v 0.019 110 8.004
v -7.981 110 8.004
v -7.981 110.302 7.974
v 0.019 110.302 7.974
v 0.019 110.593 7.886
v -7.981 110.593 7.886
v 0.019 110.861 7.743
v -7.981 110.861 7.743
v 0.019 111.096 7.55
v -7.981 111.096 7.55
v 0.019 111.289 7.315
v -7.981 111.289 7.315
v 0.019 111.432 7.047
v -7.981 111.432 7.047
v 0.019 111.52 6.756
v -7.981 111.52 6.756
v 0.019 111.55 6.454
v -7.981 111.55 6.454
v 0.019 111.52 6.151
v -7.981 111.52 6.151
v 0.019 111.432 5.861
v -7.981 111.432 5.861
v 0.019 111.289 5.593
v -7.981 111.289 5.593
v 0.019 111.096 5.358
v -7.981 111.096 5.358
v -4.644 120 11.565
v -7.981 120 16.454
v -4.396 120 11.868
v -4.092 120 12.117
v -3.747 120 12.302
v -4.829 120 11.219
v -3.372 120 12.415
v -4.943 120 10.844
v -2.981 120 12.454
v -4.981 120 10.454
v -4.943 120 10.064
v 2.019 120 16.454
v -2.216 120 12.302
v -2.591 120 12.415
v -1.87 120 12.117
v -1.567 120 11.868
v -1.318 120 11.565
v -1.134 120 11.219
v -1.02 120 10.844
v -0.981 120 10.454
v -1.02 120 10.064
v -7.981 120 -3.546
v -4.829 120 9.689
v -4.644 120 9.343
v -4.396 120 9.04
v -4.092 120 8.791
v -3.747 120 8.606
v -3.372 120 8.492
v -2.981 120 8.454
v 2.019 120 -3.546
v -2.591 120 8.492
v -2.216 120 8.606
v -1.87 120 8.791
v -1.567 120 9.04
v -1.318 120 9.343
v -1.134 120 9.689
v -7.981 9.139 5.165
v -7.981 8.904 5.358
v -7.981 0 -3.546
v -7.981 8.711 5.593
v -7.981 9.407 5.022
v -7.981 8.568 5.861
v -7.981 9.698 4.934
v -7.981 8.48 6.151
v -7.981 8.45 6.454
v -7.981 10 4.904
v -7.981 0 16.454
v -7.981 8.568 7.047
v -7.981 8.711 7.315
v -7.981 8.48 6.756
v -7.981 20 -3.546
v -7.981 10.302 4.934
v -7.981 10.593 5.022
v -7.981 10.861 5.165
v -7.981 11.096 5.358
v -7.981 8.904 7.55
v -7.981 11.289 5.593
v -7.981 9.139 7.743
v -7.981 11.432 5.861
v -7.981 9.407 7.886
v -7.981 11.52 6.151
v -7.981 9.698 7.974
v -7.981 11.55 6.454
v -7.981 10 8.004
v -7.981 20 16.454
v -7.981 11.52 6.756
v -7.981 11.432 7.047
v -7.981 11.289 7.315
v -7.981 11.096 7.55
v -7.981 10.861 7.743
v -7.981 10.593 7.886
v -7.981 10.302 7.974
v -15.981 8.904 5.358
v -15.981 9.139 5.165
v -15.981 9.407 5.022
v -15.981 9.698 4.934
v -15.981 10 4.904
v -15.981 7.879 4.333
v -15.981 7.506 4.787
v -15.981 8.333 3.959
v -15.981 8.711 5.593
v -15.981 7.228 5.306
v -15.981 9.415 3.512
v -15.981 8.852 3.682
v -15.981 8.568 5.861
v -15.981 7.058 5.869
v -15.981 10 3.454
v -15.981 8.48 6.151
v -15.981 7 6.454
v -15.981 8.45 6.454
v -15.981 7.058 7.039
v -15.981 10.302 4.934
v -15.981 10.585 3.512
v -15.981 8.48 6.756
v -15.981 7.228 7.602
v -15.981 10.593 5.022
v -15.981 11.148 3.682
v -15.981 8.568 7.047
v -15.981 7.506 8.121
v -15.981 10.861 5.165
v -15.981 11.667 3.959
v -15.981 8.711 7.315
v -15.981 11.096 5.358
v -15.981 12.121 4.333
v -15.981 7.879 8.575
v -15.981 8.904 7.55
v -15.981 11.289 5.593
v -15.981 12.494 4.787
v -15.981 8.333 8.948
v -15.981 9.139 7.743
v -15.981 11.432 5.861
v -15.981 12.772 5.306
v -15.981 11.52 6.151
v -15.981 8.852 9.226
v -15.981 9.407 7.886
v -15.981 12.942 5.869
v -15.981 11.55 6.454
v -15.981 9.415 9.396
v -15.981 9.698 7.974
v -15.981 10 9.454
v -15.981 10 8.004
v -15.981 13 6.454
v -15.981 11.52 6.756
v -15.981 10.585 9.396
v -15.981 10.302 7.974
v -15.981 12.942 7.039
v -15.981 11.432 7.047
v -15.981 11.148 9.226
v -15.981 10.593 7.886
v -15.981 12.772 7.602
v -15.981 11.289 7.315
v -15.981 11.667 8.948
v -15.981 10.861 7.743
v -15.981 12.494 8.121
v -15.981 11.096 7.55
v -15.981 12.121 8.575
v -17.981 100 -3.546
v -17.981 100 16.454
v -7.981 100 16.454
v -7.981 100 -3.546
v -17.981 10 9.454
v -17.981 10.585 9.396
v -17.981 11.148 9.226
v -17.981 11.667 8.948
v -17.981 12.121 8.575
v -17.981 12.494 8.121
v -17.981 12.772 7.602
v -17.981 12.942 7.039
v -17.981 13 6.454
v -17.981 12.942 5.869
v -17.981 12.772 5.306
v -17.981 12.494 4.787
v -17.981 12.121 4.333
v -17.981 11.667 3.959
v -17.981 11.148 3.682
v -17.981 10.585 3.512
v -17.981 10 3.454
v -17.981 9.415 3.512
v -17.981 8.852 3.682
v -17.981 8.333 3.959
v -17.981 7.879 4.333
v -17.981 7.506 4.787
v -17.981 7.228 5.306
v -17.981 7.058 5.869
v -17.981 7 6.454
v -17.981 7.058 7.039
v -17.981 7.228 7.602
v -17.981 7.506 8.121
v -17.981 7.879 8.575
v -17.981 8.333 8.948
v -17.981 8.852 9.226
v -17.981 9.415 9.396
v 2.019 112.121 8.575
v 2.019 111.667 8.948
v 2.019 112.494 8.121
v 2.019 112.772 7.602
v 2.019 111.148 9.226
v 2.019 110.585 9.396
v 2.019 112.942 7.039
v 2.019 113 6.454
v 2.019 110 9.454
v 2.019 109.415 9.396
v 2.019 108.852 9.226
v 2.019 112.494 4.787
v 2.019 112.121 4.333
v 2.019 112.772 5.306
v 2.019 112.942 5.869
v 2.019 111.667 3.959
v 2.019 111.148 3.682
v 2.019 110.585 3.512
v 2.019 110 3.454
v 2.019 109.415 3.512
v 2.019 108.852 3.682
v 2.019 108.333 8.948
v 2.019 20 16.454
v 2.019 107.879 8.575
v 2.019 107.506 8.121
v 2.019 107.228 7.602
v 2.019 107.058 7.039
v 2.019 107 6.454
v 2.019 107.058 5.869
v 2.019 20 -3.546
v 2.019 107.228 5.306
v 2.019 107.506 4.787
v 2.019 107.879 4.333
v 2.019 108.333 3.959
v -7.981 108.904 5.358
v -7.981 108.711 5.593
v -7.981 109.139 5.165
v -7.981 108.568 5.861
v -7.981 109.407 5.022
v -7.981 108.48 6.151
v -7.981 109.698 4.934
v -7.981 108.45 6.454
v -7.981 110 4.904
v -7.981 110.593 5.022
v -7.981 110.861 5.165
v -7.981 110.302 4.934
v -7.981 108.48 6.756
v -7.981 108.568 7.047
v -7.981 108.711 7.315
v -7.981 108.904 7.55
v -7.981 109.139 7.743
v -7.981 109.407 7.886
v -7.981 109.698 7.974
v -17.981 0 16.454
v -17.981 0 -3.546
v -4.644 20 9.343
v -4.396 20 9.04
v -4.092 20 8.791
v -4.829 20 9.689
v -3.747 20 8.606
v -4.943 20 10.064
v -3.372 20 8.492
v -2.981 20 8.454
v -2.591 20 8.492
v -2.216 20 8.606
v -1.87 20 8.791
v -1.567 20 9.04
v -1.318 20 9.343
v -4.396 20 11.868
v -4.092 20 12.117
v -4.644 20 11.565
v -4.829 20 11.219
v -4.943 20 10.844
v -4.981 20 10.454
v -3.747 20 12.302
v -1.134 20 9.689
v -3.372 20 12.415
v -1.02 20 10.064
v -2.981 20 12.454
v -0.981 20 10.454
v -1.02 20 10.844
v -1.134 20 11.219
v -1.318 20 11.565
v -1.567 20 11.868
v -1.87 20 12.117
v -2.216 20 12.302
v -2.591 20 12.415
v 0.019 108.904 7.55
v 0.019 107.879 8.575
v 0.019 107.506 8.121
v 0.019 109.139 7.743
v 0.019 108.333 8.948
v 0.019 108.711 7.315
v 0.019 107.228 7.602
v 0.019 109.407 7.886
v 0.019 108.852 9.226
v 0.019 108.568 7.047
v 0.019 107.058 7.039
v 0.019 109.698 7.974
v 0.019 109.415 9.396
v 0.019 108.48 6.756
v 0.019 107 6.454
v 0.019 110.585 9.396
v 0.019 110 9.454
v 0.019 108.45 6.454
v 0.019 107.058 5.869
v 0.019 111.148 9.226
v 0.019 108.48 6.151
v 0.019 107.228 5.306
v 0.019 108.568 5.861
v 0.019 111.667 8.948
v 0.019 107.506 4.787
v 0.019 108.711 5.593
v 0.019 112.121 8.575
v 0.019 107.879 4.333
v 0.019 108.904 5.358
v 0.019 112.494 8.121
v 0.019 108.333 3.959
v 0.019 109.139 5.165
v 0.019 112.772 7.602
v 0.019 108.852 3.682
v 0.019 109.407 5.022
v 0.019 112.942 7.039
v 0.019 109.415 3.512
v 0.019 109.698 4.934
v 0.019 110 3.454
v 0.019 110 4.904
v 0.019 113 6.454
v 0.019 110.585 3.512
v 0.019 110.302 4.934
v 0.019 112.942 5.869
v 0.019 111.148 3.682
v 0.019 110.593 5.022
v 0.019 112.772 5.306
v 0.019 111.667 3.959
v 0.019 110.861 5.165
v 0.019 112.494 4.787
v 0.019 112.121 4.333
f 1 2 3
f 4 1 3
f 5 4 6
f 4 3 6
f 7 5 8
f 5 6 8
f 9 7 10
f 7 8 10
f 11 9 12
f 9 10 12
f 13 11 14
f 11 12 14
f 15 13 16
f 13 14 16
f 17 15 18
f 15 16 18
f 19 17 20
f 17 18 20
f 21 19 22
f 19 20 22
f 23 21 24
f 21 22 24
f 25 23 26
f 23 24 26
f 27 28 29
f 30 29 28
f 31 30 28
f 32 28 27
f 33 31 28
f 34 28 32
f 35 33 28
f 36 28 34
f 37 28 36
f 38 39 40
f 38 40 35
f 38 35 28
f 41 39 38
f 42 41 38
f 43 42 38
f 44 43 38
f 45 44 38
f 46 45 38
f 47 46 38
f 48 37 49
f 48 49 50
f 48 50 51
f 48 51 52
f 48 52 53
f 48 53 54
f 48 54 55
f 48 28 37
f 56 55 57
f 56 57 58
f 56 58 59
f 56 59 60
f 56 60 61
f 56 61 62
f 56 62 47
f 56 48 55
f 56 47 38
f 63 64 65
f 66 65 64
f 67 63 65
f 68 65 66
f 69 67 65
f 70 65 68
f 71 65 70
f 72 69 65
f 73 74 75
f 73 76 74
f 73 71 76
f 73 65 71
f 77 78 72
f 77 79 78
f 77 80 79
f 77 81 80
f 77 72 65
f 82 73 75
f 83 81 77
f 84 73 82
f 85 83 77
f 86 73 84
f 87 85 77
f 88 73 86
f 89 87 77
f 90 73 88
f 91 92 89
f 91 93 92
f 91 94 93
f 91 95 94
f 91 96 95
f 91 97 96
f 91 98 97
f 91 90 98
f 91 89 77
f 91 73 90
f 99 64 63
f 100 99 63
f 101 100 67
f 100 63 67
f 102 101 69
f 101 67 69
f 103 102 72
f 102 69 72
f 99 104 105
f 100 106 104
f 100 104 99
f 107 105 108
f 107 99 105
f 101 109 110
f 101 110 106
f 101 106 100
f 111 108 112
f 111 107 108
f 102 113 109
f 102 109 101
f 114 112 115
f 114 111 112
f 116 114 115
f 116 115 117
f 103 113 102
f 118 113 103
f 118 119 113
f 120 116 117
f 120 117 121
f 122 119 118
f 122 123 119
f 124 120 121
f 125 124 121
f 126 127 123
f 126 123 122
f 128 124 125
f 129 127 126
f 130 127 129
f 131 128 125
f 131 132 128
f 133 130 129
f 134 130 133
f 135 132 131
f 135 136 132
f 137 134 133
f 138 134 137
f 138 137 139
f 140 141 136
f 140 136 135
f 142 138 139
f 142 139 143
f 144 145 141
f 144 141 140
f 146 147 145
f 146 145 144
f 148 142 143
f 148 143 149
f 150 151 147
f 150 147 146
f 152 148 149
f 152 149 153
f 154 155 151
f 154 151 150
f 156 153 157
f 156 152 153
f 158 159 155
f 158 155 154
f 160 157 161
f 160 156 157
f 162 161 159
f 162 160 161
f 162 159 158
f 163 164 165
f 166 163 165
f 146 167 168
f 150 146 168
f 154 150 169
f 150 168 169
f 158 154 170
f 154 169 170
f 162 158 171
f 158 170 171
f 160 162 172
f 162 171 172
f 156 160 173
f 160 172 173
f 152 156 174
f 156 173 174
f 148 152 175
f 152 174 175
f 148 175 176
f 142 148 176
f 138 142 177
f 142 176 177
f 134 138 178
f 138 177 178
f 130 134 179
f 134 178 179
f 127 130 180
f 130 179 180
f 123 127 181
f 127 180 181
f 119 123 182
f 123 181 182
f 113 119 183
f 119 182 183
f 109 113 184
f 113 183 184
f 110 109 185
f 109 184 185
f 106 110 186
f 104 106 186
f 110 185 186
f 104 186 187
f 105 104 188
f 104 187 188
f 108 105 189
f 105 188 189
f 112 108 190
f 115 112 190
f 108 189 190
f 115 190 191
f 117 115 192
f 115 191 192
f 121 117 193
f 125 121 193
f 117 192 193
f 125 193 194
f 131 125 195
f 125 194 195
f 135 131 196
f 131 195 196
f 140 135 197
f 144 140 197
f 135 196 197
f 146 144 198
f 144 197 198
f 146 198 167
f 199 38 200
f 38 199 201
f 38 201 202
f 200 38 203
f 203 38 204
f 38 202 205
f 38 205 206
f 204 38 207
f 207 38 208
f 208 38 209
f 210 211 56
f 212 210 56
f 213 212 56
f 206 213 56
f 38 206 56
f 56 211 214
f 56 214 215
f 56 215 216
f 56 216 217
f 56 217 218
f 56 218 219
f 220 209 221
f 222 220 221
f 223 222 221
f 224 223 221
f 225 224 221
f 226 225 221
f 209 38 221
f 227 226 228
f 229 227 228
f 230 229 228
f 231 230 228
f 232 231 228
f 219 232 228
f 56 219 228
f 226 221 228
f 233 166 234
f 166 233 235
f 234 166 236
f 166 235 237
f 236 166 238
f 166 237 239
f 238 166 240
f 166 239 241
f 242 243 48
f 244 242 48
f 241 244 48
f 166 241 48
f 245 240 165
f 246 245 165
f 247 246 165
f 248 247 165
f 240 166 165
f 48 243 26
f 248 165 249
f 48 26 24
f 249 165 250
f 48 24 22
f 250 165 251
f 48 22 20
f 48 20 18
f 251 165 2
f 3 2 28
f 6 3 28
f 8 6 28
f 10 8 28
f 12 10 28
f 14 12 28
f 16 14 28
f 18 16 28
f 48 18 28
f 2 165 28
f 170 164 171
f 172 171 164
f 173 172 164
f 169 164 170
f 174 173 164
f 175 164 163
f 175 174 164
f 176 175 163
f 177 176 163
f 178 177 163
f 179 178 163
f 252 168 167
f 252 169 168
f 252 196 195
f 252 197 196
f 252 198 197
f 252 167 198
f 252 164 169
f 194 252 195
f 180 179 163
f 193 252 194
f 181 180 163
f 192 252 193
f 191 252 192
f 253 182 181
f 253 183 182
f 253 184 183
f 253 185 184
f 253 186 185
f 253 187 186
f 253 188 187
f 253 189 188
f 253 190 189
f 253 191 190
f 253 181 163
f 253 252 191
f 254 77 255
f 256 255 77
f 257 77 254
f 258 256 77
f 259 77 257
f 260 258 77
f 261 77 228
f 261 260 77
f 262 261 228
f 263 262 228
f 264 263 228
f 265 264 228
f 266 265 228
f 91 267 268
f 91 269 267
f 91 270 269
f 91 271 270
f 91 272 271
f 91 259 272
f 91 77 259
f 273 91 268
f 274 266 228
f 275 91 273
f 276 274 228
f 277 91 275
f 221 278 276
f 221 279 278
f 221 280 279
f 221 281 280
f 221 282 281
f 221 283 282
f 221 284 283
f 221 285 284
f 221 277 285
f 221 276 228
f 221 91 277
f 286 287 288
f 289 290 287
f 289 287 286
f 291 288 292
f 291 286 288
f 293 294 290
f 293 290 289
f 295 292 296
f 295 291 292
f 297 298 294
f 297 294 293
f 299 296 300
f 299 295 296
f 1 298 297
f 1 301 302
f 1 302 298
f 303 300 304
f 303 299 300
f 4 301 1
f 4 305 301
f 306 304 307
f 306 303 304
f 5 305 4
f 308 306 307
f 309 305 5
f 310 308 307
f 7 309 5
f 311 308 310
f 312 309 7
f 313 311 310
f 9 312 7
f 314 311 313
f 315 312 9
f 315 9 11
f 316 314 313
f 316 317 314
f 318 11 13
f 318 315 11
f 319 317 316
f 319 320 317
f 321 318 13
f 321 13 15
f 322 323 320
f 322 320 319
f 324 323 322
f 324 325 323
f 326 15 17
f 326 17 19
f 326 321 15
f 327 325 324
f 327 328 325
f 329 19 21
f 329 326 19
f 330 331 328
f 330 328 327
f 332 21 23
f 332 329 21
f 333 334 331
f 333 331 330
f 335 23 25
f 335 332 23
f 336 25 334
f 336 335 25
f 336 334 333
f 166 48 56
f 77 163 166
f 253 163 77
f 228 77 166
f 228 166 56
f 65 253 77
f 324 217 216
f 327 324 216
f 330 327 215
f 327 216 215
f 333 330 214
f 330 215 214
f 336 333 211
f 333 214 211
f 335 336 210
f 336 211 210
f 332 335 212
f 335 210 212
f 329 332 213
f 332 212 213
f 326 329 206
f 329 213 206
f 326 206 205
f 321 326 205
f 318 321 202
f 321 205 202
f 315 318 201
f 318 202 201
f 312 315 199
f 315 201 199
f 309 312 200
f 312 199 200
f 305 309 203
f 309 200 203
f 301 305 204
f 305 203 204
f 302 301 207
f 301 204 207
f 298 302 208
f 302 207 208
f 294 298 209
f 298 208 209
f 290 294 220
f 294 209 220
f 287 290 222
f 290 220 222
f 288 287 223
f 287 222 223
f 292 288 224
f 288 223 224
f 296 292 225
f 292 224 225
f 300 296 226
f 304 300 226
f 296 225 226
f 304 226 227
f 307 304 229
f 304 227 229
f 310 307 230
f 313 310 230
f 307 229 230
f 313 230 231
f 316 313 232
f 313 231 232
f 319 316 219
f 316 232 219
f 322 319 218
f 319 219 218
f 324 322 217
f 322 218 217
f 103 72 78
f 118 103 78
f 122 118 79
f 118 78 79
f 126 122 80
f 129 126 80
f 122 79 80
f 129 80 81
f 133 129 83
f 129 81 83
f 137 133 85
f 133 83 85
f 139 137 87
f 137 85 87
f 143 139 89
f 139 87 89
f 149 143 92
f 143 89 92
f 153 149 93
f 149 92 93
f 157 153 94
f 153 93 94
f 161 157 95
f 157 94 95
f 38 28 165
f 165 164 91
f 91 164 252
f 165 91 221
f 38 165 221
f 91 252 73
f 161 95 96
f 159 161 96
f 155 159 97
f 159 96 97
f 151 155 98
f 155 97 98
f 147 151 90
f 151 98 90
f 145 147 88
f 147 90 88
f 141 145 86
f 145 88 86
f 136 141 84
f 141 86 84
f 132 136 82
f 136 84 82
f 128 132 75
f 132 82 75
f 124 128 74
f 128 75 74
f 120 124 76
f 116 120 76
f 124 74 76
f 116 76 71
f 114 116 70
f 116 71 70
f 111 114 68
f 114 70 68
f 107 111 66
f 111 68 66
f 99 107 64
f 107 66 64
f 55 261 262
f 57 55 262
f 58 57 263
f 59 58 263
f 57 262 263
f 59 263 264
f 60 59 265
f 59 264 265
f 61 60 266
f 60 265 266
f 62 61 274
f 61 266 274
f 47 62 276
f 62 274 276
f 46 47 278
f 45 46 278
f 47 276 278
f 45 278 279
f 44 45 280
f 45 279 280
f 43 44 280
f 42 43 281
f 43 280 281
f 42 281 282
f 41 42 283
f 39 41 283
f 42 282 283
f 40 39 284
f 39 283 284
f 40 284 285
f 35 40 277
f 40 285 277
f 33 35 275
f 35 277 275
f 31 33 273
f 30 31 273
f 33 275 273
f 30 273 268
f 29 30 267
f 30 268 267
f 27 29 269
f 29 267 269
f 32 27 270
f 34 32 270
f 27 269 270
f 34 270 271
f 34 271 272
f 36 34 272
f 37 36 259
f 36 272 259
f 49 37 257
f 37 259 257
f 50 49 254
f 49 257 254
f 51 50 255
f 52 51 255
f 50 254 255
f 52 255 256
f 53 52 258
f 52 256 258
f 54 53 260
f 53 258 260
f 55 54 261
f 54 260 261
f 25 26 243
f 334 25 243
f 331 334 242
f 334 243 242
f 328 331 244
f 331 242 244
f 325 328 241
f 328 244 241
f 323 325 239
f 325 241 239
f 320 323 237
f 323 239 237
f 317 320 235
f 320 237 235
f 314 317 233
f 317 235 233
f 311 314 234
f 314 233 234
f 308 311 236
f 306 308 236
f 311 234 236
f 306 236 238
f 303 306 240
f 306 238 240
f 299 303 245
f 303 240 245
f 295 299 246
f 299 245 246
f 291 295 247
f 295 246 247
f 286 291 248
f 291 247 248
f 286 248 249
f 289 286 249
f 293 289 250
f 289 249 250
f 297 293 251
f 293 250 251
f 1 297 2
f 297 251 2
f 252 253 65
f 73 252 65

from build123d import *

# Parameters (mm, degrees)
SKETCH_1_W          = 20
SKETCH_1_H          = 20
EXTRUDE_1_DEPTH     = 120
SKETCH_2_W          = 10
SKETCH_2_H          = 20
CUT_EXTRUDE_1_DEPTH = 120
SKETCH_3_W          = 10
SKETCH_3_H          = 20
CUT_EXTRUDE_2_DEPTH = 120
CUT_EXTRUDE_3_DEPTH = 120
SKETCH_5_R          = 3
CUT_EXTRUDE_4_DEPTH = 2
CUT_EXTRUDE_5_DEPTH = 20
SKETCH_7_R          = 3
CUT_EXTRUDE_6_DEPTH = 2
SKETCH_8_R          = 2
CUT_EXTRUDE_7_DEPTH = 100


with BuildPart() as part:
    # 草图1 → 凸台-拉伸1 (new body)
    with BuildSketch(Plane(origin=(0, 0, 0), x_dir=(1, 0, 0), z_dir=(0, 1, 0))):
        with Locations((-7.981321578, -6.453869679)):
            Rectangle(SKETCH_1_W, SKETCH_1_H)
    extrude(amount=EXTRUDE_1_DEPTH)

    # 草图2 → 切除-拉伸1 (cut)
    with BuildSketch(Plane.XY.offset(16.453869679)):
        with Locations((-12.981321578, 110)):
            Rectangle(SKETCH_2_W, SKETCH_2_H)
    extrude(amount=-CUT_EXTRUDE_1_DEPTH, mode=Mode.SUBTRACT)

    # 草图3 → 切除-拉伸2 (cut)
    with BuildSketch(Plane.XY.offset(16.453869679)):
        with Locations((-2.981321578, 10)):
            Rectangle(SKETCH_3_W, SKETCH_3_H)
    extrude(amount=-CUT_EXTRUDE_2_DEPTH, mode=Mode.SUBTRACT)

    # 草图4 → 切除-拉伸3 (cut)
    with BuildSketch(Plane.ZY.offset(7.981321578)):
        with BuildLine():
            ThreePointArc((8.003869679, 110), (7.047028999, 111.432013275), (5.357854168, 111.096015511))
            Line((5.357854168, 111.096015511), (7.549885189, 108.903984489))
            ThreePointArc((7.549885189, 108.903984489), (7.885882954, 109.40684068), (8.003869679, 110))
        make_face()
        with BuildLine():
            Line((7.549885189, 108.903984489), (5.357854168, 111.096015511))
            ThreePointArc((5.357854168, 111.096015511), (5.357854168, 108.903984489), (7.549885189, 108.903984489))
        make_face()
    extrude(amount=-CUT_EXTRUDE_3_DEPTH, mode=Mode.SUBTRACT)

    # 草图5 → 切除-拉伸4 (cut)
    with BuildSketch(Plane(origin=(2.018678422, 0, 0), x_dir=(0, 0, -1), z_dir=(1, 0, 0))):
        with Locations((-6.453869679, 110)):
            Circle(SKETCH_5_R)
    extrude(amount=-CUT_EXTRUDE_4_DEPTH, mode=Mode.SUBTRACT)

    # 草图6 → 切除-拉伸5 (cut)
    with BuildSketch(Plane(origin=(-7.981321578, 0, 0), x_dir=(0, 0, -1), z_dir=(1, 0, 0))):
        with BuildLine():
            ThreePointArc((-4.903869679, 10), (-5.860710358, 11.432013275), (-7.549885189, 11.096015511))
            Line((-7.549885189, 11.096015511), (-5.357854168, 8.903984489))
            ThreePointArc((-5.357854168, 8.903984489), (-5.021856403, 9.40684068), (-4.903869679, 10))
        make_face()
        with BuildLine():
            Line((-5.357854168, 8.903984489), (-7.549885189, 11.096015511))
            ThreePointArc((-7.549885189, 11.096015511), (-7.549885189, 8.903984489), (-5.357854168, 8.903984489))
        make_face()
    extrude(amount=-CUT_EXTRUDE_5_DEPTH, mode=Mode.SUBTRACT)

    # 草图7 → 切除-拉伸6 (cut)
    with BuildSketch(Plane.ZY.offset(17.981321578)):
        with Locations((6.453869679, 10)):
            Circle(SKETCH_7_R)
    extrude(amount=-CUT_EXTRUDE_6_DEPTH, mode=Mode.SUBTRACT)

    # 草图8 → 切除-拉伸7 (cut)
    with BuildSketch(Plane.XZ.offset(-20)):
        with Locations(Location((-2.981321578, 10.453869679, 0), (0, 0, 270))):
            Circle(SKETCH_8_R)
    extrude(amount=-CUT_EXTRUDE_7_DEPTH, mode=Mode.SUBTRACT)


solid = part.part
